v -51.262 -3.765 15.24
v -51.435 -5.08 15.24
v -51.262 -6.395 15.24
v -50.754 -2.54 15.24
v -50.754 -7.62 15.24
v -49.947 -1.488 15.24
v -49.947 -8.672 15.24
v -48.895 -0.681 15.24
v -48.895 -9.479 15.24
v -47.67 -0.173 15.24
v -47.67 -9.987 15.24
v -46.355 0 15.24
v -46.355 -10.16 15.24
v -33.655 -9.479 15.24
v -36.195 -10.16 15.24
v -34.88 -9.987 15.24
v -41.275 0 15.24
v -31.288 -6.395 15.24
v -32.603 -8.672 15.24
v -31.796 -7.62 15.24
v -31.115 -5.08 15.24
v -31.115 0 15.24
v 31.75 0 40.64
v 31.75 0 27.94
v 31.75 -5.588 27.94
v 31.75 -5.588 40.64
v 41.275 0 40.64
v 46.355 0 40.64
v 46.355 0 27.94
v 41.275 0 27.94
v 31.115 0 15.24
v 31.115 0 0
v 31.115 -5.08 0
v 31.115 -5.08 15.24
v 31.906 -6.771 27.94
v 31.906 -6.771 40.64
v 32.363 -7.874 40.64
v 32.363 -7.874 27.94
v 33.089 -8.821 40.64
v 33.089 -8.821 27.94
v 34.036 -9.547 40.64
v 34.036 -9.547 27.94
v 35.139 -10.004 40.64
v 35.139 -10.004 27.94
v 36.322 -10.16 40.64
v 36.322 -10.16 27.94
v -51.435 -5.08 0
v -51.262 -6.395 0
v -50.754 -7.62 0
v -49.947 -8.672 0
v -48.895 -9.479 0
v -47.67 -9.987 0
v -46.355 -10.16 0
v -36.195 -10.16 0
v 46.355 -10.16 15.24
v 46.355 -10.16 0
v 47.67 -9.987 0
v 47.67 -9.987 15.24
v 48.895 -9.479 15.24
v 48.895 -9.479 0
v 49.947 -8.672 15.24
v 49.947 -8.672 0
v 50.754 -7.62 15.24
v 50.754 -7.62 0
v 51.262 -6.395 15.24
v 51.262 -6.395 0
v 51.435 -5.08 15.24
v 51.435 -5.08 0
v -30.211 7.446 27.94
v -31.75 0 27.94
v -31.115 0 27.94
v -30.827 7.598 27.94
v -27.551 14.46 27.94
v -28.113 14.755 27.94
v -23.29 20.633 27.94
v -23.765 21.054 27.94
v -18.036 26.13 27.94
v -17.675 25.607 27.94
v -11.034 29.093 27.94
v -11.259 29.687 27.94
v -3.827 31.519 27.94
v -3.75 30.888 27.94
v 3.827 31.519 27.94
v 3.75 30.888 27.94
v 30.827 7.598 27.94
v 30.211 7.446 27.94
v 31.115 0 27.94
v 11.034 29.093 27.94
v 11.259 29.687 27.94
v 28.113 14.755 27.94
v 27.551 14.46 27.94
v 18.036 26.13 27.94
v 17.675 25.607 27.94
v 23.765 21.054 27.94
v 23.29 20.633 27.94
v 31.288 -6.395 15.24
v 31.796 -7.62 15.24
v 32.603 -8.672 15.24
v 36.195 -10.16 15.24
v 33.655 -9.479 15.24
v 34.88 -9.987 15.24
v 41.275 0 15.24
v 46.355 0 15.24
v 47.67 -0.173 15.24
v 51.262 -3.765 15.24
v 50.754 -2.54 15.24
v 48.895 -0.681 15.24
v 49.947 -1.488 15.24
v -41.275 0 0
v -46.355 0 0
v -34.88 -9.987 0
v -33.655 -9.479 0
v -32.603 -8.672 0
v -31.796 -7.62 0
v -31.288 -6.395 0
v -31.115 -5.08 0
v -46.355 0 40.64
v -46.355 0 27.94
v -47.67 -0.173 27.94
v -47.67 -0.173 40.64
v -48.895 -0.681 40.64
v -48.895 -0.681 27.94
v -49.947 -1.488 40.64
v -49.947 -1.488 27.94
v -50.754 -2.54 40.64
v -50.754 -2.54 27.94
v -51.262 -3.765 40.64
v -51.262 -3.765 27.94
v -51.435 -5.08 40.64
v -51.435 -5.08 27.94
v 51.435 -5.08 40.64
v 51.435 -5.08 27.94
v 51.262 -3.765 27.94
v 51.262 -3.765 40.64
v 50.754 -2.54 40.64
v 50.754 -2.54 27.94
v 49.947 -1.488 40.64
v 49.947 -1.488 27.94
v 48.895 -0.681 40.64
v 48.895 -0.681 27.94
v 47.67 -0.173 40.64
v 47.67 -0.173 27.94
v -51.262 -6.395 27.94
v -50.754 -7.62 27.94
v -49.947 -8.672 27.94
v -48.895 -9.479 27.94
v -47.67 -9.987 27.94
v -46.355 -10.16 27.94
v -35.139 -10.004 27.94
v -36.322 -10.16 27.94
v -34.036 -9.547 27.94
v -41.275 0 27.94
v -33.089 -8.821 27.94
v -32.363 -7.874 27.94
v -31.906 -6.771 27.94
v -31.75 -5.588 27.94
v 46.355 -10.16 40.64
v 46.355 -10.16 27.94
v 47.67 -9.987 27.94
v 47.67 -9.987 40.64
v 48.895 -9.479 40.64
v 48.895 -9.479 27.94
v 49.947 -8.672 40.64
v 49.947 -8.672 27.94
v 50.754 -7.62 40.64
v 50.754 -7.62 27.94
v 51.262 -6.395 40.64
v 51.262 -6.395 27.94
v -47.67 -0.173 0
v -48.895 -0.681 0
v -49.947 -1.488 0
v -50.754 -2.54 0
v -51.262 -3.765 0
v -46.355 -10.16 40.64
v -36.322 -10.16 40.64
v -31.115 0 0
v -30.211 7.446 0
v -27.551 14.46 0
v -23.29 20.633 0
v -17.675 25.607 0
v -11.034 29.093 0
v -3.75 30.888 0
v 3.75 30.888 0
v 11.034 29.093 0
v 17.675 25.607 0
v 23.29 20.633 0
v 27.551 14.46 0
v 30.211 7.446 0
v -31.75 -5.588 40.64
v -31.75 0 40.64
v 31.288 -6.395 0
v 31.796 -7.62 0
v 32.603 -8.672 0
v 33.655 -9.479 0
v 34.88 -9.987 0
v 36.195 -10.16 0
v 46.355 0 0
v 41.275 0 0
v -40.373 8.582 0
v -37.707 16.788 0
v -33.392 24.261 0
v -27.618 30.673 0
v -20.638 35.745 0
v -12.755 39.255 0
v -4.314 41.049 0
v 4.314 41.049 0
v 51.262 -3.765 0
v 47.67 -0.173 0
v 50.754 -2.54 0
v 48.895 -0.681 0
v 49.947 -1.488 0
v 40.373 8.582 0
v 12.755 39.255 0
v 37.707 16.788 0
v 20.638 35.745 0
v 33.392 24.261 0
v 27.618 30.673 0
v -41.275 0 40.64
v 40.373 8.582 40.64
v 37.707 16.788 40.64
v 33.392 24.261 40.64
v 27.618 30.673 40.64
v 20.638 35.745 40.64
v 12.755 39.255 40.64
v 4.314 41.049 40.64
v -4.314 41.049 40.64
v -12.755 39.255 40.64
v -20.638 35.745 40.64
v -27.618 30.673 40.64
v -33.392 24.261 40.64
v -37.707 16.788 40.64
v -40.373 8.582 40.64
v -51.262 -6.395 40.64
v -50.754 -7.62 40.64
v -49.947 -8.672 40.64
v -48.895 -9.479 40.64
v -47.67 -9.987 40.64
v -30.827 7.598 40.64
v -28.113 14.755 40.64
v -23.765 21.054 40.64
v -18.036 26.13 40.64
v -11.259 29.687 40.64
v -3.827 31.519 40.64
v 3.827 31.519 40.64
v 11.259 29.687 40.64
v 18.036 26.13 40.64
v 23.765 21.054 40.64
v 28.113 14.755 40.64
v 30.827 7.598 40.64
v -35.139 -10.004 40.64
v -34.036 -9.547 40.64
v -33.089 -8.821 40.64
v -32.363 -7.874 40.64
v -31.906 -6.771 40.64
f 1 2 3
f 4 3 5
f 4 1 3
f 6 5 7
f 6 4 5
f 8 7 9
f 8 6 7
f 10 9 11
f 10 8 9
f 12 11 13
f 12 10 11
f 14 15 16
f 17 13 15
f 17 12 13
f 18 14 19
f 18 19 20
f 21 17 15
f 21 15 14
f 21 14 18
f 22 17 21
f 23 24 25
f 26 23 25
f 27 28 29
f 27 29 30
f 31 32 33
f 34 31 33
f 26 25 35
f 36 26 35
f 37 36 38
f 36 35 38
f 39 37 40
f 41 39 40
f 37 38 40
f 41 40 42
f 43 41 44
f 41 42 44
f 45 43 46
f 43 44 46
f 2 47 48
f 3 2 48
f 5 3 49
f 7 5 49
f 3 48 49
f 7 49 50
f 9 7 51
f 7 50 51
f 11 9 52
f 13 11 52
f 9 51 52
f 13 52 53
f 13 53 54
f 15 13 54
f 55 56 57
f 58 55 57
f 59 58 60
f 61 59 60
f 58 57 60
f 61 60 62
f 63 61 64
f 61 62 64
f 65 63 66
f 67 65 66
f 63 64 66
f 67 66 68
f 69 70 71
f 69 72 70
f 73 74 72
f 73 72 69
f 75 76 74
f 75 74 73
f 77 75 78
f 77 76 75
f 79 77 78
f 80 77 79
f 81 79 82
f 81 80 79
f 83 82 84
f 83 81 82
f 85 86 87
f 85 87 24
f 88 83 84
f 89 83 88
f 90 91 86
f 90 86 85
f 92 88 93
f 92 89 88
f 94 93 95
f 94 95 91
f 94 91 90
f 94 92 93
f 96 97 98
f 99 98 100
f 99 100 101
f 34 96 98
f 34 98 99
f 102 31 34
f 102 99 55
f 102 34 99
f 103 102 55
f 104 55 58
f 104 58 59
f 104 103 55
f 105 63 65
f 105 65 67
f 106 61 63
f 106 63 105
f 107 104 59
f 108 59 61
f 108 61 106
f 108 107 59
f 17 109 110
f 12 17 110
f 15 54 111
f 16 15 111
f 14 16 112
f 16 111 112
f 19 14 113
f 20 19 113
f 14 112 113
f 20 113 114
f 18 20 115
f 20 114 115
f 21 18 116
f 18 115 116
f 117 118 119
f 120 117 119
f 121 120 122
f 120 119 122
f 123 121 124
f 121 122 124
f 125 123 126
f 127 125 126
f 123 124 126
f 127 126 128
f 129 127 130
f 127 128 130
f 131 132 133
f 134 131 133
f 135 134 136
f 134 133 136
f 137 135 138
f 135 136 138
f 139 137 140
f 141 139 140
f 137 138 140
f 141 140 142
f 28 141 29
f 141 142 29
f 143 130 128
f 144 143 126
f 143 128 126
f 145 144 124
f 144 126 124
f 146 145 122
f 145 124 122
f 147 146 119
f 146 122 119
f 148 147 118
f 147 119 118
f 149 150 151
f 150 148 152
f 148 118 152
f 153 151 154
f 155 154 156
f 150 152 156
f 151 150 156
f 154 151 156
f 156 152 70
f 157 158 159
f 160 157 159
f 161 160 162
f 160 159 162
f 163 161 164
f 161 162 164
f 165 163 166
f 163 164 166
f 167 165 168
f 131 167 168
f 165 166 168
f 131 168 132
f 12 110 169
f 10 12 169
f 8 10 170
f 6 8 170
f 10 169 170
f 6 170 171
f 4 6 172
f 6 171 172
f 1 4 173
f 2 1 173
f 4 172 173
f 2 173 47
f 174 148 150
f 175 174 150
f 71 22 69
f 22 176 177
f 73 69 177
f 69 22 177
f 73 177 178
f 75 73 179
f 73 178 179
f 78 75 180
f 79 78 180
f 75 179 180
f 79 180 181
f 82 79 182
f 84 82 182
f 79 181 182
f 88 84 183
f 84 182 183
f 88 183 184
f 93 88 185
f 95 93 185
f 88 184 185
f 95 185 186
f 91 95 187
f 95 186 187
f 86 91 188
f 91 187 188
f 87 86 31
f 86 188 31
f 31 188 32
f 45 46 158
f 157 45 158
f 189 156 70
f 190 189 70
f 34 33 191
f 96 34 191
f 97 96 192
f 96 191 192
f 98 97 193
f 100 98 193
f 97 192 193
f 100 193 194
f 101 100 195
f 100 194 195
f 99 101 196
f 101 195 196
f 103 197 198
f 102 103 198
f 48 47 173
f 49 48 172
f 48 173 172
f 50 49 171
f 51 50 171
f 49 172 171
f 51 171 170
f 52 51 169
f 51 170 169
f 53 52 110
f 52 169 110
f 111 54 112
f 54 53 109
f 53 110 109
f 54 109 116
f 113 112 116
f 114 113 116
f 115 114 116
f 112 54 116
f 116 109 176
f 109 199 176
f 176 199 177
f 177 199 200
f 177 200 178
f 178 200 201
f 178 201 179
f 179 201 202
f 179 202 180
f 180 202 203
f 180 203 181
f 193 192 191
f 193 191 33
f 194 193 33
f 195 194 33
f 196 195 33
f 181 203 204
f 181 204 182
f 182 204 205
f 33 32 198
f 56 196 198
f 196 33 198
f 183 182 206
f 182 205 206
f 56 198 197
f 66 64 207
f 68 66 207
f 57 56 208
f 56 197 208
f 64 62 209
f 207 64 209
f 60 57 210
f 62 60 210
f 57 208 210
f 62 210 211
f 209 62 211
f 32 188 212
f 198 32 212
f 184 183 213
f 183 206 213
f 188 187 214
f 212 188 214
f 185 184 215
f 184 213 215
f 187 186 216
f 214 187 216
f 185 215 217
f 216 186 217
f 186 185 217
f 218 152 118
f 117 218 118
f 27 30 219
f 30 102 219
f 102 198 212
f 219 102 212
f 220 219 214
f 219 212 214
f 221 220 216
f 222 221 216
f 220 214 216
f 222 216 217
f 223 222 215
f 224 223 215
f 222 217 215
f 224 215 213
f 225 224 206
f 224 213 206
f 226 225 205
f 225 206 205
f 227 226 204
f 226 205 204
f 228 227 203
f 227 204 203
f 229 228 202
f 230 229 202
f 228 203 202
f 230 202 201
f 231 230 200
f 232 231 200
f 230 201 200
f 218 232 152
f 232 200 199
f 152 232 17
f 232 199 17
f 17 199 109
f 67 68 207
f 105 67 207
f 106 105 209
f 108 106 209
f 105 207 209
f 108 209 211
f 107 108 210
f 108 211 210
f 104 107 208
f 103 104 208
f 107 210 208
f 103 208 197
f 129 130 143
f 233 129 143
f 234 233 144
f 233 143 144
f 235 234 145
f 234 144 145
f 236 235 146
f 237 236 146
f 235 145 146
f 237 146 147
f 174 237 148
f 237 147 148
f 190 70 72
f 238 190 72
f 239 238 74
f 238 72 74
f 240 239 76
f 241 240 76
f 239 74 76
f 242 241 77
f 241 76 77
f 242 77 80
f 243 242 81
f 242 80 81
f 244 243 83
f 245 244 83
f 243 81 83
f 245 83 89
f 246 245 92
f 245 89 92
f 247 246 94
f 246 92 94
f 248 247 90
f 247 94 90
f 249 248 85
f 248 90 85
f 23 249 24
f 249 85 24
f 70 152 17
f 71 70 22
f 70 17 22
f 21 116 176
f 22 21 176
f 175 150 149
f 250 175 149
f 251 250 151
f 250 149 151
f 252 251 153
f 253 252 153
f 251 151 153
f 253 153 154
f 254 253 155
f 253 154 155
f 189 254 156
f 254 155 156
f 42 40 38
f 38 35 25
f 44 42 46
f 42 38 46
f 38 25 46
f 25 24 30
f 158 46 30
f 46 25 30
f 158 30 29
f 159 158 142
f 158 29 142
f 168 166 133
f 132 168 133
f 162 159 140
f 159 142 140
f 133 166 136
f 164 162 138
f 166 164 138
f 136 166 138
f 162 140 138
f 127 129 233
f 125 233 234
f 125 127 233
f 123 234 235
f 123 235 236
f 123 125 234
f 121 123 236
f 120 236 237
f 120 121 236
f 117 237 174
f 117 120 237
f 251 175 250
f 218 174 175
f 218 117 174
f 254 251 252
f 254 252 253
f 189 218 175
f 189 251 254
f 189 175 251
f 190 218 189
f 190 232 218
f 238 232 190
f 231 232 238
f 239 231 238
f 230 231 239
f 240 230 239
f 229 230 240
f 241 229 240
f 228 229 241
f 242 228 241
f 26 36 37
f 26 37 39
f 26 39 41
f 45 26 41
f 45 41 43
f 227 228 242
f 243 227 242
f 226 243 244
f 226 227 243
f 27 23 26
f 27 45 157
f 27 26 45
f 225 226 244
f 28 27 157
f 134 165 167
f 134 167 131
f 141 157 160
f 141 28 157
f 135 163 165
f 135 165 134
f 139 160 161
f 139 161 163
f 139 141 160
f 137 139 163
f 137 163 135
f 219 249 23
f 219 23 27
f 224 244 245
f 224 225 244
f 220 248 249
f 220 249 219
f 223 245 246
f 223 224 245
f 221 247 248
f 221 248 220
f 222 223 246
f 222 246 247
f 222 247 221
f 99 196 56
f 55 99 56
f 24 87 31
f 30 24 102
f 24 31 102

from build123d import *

# Parameters (mm, degrees)
F1_DEPTH = 27.94
F2_DEPTH = 15.24
F4_DEPTH = 12.7


with BuildPart() as f1:
    # F0 (on Top) → F1 (new body)
    with BuildSketch(Plane.XY):
        with BuildLine():
            ThreePointArc((-31.115, 0), (0, 31.115), (31.115, 0))
            Line((31.115, 0), (41.275, 0))
            ThreePointArc((41.275, 0), (0, 41.275), (-41.275, 0))
            Line((-41.275, 0), (-31.115, 0))
        make_face()
    extrude(amount=F1_DEPTH)

    # F0 (on Top) → F2 (join)
    with BuildSketch(Plane.XY):
        with BuildLine():
            ThreePointArc((-40.005, -10.16), (-40.9562693614, -5.1195336702), (-41.275, 0))
            Line((-41.275, 0), (-46.355, 0))
            ThreePointArc((-46.355, 0), (-49.9471024484, -1.4878975516), (-51.435, -5.08))
            ThreePointArc((-51.435, -5.08), (-49.9471024484, -8.6721024484), (-46.355, -10.16))
            Line((-46.355, -10.16), (-40.005, -10.16))
        make_face()
        with BuildLine():
            Line((-31.115, -5.08), (-31.115, 0))
            Line((-31.115, 0), (-41.275, 0))
            ThreePointArc((-41.275, 0), (-40.9562693614, -5.1195336702), (-40.005, -10.16))
            Line((-40.005, -10.16), (-36.195, -10.16))
            ThreePointArc((-36.195, -10.16), (-32.6028975516, -8.6721024484), (-31.115, -5.08))
        make_face()
        with BuildLine():
            Line((41.275, 0), (31.115, 0))
            Line((31.115, 0), (31.115, -5.08))
            ThreePointArc((31.115, -5.08), (32.6028975516, -8.6721024484), (36.195, -10.16))
            Line((36.195, -10.16), (40.005, -10.16))
            ThreePointArc((40.005, -10.16), (40.9562693614, -5.1195336702), (41.275, 0))
        make_face()
        with BuildLine():
            Line((46.355, 0), (41.275, 0))
            ThreePointArc((41.275, 0), (40.9562693614, -5.1195336702), (40.005, -10.16))
            Line((40.005, -10.16), (46.355, -10.16))
            ThreePointArc((46.355, -10.16), (49.9471024484, -8.6721024484), (51.435, -5.08))
            ThreePointArc((51.435, -5.08), (49.9471024484, -1.4878975516), (46.355, 0))
        make_face()
    extrude(amount=F2_DEPTH)

    # F3 (on face) → F4 (join)
    with BuildSketch(Plane.XY.offset(27.94)):
        with BuildLine():
            ThreePointArc((-40.005, -10.16), (-40.9562693614, -5.1195336702), (-41.275, 0))
            Line((-41.275, 0), (-46.355, 0))
            ThreePointArc((-46.355, 0), (-49.9471024484, -1.4878975516), (-51.435, -5.08))
            ThreePointArc((-51.435, -5.08), (-49.9471024484, -8.6721024484), (-46.355, -10.16))
            Line((-46.355, -10.16), (-40.005, -10.16))
        make_face()
        with BuildLine():
            Line((-31.75, -5.588), (-31.75, 0))
            Line((-31.75, 0), (-41.275, 0))
            ThreePointArc((-41.275, 0), (-40.9562693614, -5.1195336702), (-40.005, -10.16))
            Line((-40.005, -10.16), (-36.322, -10.16))
            ThreePointArc((-36.322, -10.16), (-33.0891077964, -8.8208922036), (-31.75, -5.588))
        make_face()
        with BuildLine():
            ThreePointArc((-31.75, 0), (0, 31.75), (31.75, 0))
            Line((31.75, 0), (41.275, 0))
            ThreePointArc((41.275, 0), (0, 41.275), (-41.275, 0))
            Line((-41.275, 0), (-31.75, 0))
        make_face()
        with BuildLine():
            Line((41.275, 0), (31.75, 0))
            Line((31.75, 0), (31.75, -5.588))
            ThreePointArc((31.75, -5.588), (33.0891077964, -8.8208922036), (36.322, -10.16))
            Line((36.322, -10.16), (40.005, -10.16))
            ThreePointArc((40.005, -10.16), (40.9562693614, -5.1195336702), (41.275, 0))
        make_face()
        with BuildLine():
            Line((46.355, 0), (41.275, 0))
            ThreePointArc((41.275, 0), (40.9562693614, -5.1195336702), (40.005, -10.16))
            Line((40.005, -10.16), (46.355, -10.16))
            ThreePointArc((46.355, -10.16), (49.9471024484, -8.6721024484), (51.435, -5.08))
            ThreePointArc((51.435, -5.08), (49.9471024484, -1.4878975516), (46.355, 0))
        make_face()
    extrude(amount=F4_DEPTH)


solid = f1.part
